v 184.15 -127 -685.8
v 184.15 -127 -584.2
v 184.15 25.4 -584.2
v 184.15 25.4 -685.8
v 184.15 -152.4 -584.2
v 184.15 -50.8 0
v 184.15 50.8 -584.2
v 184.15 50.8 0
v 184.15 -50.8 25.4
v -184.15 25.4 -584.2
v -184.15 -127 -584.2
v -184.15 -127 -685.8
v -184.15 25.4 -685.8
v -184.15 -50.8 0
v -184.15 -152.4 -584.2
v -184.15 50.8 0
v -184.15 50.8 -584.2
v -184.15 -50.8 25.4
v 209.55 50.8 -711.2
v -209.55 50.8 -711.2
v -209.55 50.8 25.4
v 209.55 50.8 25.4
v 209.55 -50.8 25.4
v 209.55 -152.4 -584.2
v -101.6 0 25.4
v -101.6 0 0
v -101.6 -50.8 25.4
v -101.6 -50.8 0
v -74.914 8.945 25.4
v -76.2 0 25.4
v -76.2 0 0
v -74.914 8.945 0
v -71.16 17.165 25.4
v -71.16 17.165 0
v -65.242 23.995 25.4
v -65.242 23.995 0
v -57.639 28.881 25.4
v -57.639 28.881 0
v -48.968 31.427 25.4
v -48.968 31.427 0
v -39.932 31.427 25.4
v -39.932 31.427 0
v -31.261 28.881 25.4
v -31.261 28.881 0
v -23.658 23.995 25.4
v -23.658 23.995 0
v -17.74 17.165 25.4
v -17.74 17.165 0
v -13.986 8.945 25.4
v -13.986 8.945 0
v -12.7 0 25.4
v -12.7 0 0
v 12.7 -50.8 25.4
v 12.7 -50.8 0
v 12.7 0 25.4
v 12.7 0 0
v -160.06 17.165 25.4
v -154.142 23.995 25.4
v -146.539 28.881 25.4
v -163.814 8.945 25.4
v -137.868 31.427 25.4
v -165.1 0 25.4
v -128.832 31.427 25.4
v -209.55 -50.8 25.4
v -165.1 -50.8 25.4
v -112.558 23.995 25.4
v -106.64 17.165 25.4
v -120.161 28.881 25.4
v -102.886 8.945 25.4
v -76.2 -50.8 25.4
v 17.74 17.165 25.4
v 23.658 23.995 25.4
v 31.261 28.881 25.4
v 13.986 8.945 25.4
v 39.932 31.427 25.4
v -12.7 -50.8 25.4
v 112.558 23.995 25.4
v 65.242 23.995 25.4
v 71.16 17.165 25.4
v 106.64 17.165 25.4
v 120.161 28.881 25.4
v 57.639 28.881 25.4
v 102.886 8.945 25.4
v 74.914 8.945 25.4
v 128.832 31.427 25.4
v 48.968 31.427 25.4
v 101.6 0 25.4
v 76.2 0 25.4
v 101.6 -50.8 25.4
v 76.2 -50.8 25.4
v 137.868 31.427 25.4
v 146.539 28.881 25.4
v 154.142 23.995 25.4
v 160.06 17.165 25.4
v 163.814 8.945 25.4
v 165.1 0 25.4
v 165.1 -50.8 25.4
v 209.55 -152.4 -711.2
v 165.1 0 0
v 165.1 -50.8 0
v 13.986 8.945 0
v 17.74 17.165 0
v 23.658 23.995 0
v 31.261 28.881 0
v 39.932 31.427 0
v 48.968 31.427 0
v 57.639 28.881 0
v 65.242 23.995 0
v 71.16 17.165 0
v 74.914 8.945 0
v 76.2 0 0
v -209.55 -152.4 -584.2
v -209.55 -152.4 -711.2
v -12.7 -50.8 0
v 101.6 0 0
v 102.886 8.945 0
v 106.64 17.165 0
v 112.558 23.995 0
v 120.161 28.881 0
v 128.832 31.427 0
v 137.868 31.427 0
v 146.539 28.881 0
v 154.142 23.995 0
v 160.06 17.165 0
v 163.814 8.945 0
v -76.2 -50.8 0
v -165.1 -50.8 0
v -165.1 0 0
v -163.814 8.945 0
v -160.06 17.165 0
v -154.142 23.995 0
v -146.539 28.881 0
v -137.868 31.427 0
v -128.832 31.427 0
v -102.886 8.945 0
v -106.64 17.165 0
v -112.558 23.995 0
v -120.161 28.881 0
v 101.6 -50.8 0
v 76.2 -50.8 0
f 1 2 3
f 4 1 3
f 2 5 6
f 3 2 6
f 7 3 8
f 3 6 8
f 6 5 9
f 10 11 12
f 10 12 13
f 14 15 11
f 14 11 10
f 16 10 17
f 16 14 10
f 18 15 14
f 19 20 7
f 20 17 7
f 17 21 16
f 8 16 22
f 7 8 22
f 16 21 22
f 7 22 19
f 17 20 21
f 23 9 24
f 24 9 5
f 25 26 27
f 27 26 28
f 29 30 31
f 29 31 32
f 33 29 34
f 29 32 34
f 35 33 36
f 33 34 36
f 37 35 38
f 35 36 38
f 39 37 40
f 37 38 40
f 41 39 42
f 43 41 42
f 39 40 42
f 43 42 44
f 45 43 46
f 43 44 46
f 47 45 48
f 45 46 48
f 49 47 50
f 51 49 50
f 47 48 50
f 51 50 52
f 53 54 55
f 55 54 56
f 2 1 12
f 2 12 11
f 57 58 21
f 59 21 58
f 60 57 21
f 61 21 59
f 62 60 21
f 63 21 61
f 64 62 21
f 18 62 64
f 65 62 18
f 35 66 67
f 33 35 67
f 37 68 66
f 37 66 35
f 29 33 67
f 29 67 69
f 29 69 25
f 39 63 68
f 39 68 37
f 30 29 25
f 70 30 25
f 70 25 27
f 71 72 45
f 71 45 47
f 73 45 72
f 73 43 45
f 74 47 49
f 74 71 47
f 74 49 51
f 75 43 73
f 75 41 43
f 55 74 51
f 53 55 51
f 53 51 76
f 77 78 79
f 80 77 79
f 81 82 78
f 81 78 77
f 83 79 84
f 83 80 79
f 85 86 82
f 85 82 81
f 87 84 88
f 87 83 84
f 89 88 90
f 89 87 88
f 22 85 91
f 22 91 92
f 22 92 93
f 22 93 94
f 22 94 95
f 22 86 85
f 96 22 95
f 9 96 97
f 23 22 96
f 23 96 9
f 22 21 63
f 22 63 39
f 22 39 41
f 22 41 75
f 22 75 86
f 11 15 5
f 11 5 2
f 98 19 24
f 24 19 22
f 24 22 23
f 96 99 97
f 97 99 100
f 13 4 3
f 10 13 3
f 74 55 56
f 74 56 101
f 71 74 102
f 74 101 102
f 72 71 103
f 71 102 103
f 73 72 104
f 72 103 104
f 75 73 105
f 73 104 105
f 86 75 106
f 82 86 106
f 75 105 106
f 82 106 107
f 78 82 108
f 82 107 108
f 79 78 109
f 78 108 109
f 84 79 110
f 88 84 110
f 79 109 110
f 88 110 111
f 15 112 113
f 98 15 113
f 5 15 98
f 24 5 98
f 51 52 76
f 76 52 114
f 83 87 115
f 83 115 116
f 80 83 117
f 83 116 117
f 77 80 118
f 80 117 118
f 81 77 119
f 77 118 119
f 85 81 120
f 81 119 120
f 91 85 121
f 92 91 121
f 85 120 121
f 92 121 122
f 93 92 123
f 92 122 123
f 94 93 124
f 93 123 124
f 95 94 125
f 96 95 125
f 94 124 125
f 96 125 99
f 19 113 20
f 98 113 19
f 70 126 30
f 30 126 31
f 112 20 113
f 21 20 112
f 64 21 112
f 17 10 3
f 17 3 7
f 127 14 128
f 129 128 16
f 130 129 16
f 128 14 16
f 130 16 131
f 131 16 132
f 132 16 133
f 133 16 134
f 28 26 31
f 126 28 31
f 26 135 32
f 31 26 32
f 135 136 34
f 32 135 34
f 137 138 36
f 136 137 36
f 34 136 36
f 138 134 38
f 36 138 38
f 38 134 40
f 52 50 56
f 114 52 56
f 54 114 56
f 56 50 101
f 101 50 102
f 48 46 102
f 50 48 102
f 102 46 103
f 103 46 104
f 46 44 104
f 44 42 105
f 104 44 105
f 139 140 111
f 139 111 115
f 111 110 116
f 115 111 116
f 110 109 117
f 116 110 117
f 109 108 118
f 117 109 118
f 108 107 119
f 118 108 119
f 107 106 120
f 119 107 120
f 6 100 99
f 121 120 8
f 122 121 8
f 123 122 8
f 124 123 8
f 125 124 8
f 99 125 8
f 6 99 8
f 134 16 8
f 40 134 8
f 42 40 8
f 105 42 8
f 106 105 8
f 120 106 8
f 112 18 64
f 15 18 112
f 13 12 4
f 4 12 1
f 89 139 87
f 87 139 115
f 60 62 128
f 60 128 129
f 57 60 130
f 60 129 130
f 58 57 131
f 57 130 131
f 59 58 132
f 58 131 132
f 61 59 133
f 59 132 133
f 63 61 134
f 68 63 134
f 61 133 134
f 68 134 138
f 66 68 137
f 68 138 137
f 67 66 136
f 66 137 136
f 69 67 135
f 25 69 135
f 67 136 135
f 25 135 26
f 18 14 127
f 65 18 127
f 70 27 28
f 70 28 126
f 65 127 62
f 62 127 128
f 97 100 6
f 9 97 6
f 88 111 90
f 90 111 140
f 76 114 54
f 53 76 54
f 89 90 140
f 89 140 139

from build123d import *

# Parameters (mm, degrees)
F1_DEPTH = 25.4
F3_DEPTH = 25.4
F5_W     = 25.4
F5_H     = 101.6
F6_DEPTH = 368.3
F7_W     = 419.1
F7_H     = 203.2
F8_DEPTH = 25.4


with BuildPart() as f1:
    # F0 (on Top) → F1 (new body)
    with BuildSketch(Plane.XY):
        with BuildLine():
            Line((184.15, -50.8), (184.15, 50.8))
            Line((184.15, 50.8), (-184.15, 50.8))
            Line((-184.15, 50.8), (-184.15, -50.8))
            Line((-184.15, -50.8), (-165.1, -50.8))
            Line((-165.1, -50.8), (-165.1, 0))
            ThreePointArc((-165.1, 0), (-133.35, 31.75), (-101.6, 0))
            Line((-101.6, 0), (-101.6, -50.8))
            Line((-101.6, -50.8), (-76.2, -50.8))
            Line((-76.2, -50.8), (-76.2, 0))
            ThreePointArc((-76.2, 0), (-44.45, 31.75), (-12.7, 0))
            Line((-12.7, 0), (-12.7, -50.8))
            Line((-12.7, -50.8), (12.7, -50.8))
            Line((12.7, -50.8), (12.7, 0))
            ThreePointArc((12.7, 0), (44.45, 31.75), (76.2, 0))
            Line((76.2, 0), (76.2, -50.8))
            Line((76.2, -50.8), (101.6, -50.8))
            Line((101.6, -50.8), (101.6, 0))
            ThreePointArc((101.6, 0), (133.35, 31.75), (165.1, 0))
            Line((165.1, 0), (165.1, -50.8))
            Line((165.1, -50.8), (184.15, -50.8))
        make_face()
    extrude(amount=F1_DEPTH)

    # F2 (on face) → F3 (join)
    with BuildSketch(Plane.YZ.offset(184.15)):
        Polygon((50.8, -685.8), (50.8, 25.4), (-50.8, 25.4), (-152.4, -584.2), (-152.4, -685.8), align=None)
    extrude(amount=F3_DEPTH)

    # F4: F1 across plane


with BuildPart() as f1_1:
    add(f1.part)
    add(f1.part.mirror(Plane.YZ))

    # F5 (on face) → F6 (join, through all)
    with BuildSketch(Plane.YZ.offset(-184.15)):
        with Locations((-139.7, -635)):
            Rectangle(F5_W, F5_H)
        with Locations((38.1, -635)):
            Rectangle(F5_W, F5_H)
    extrude(amount=F6_DEPTH)

    # F7 (on face) → F8 (join)
    with BuildSketch(Plane(origin=(0, 0, -685.8), x_dir=(1, 0, 0), z_dir=(0, 0, -1))):
        with Locations((0, 50.8)):
            Rectangle(F7_W, F7_H)
    extrude(amount=F8_DEPTH)


solid = f1_1.part
